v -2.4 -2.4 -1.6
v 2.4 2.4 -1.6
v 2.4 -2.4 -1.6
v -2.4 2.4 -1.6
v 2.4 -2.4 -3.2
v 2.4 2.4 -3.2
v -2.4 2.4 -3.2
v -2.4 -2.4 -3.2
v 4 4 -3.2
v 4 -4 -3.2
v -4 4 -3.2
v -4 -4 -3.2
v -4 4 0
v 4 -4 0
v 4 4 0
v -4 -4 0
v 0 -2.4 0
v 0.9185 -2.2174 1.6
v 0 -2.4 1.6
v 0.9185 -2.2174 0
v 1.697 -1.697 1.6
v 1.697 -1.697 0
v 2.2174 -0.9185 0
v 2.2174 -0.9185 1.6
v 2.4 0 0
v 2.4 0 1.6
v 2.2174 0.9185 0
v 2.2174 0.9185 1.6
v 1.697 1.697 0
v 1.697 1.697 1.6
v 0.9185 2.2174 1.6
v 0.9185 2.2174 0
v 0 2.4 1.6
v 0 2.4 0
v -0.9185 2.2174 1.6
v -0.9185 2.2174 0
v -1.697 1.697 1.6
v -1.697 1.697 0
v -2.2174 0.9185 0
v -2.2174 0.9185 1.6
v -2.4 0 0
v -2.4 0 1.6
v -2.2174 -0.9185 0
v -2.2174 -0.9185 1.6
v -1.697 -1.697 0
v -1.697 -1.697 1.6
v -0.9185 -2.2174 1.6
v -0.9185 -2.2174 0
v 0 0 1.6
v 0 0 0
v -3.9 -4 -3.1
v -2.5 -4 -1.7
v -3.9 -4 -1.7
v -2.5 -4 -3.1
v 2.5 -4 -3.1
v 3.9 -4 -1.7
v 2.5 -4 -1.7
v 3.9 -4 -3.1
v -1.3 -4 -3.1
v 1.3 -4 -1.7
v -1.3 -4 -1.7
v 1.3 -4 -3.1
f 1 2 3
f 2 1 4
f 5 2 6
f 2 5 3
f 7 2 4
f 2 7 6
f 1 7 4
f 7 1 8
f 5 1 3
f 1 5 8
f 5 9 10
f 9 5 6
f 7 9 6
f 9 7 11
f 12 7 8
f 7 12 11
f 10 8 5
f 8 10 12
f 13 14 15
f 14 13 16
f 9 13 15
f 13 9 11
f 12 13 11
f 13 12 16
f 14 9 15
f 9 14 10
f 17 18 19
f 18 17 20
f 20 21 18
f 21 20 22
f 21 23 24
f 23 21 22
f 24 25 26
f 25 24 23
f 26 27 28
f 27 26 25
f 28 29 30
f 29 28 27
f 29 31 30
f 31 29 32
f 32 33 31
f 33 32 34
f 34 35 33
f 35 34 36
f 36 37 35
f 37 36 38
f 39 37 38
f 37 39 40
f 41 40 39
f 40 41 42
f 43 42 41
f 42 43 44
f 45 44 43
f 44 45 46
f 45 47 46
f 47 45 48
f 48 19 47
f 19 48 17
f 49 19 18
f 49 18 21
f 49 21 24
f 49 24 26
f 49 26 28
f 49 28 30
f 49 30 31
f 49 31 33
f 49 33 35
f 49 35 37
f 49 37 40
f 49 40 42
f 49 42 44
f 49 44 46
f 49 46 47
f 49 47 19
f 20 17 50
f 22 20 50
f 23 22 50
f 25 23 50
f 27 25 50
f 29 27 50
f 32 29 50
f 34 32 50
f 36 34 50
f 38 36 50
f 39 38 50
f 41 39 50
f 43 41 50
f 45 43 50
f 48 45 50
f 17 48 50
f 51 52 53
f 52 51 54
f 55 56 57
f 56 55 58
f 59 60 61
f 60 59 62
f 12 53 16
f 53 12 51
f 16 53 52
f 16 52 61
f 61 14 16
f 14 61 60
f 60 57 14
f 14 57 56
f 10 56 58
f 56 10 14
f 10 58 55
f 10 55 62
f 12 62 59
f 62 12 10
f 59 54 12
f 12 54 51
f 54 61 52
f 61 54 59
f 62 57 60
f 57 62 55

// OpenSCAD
// file: ../p/4-4edge.scad
use <../lib.scad>
function ldraw_lib__4_4edge() = [
// 0 Circle 1.0
// 0 Name: 4-4edge.dat
// 0 Author: James Jessiman
// 0 !LDRAW_ORG Primitive UPDATE 2017-01
// 0 !LICENSE Licensed under CC BY 2.0 and CC BY 4.0 : see CAreadme.txt
// 
// 0 BFC CERTIFY CCW
  [0,"BFC","CERTIFY"],
  [0,"BFC","CCW"],
// 
// 0 !HISTORY 1998-12-15 [PTadmin] Official Update 1998-10
// 0 !HISTORY 2005-12-28 [PTadmin] Official Update 2005-01
// 0 !HISTORY 2007-06-24 [PTadmin] Header formatted for Contributor Agreement
// 0 !HISTORY 2008-07-01 [PTadmin] Official Update 2008-01
// 0 !HISTORY 2017-01-15 [Steffen] BFCed
// 0 !HISTORY 2017-12-30 [PTadmin] Official Update 2017-01
// 
// 
// 2 24 1 0 0 0.9239 0 0.3827
  [2,24,1,0,0,0.9239,0,0.3827],
// 2 24 0.9239 0 0.3827 0.7071 0 0.7071
  [2,24,0.9239,0,0.3827,0.7071,0,0.7071],
// 2 24 0.7071 0 0.7071 0.3827 0 0.9239
  [2,24,0.7071,0,0.7071,0.3827,0,0.9239],
// 2 24 0.3827 0 0.9239 0 0 1
  [2,24,0.3827,0,0.9239,0,0,1],
// 2 24 0 0 1 -0.3827 0 0.9239
  [2,24,0,0,1,-0.3827,0,0.9239],
// 2 24 -0.3827 0 0.9239 -0.7071 0 0.7071
  [2,24,-0.3827,0,0.9239,-0.7071,0,0.7071],
// 2 24 -0.7071 0 0.7071 -0.9239 0 0.3827
  [2,24,-0.7071,0,0.7071,-0.9239,0,0.3827],
// 2 24 -0.9239 0 0.3827 -1 0 -0
  [2,24,-0.9239,0,0.3827,-1,0,-0],
// 2 24 -1 0 -0 -0.9239 0 -0.3827
  [2,24,-1,0,-0,-0.9239,0,-0.3827],
// 2 24 -0.9239 0 -0.3827 -0.7071 0 -0.7071
  [2,24,-0.9239,0,-0.3827,-0.7071,0,-0.7071],
// 2 24 -0.7071 0 -0.7071 -0.3827 0 -0.9239
  [2,24,-0.7071,0,-0.7071,-0.3827,0,-0.9239],
// 2 24 -0.3827 0 -0.9239 0 0 -1
  [2,24,-0.3827,0,-0.9239,0,0,-1],
// 2 24 0 0 -1 0.3827 0 -0.9239
  [2,24,0,0,-1,0.3827,0,-0.9239],
// 2 24 0.3827 0 -0.9239 0.7071 0 -0.7071
  [2,24,0.3827,0,-0.9239,0.7071,0,-0.7071],
// 2 24 0.7071 0 -0.7071 0.9239 0 -0.3827
  [2,24,0.7071,0,-0.7071,0.9239,0,-0.3827],
// 2 24 0.9239 0 -0.3827 1 0 0
  [2,24,0.9239,0,-0.3827,1,0,0],
];
module ldraw_lib__4_4edge(step=0, col=false, unit=2/5, alt=false, line=0.2, solid=!$preview)
    makepoly(ldraw_lib__4_4edge(), step=step, col=col, unit=unit, alt=alt, line=line, solid=solid);
ldraw_lib__4_4edge(line=0.2);
// file: ../p/4-4disc.scad
use <../lib.scad>
function ldraw_lib__4_4disc() = [
// 0 Disc 1.0
// 0 Name: 4-4disc.dat
// 0 Author: James Jessiman
// 0 !LDRAW_ORG Primitive UPDATE 2002-02
// 0 !LICENSE Licensed under CC BY 2.0 and CC BY 4.0 : see CAreadme.txt
// 
// 0 BFC CERTIFY CCW
  [0,"BFC","CERTIFY"],
  [0,"BFC","CCW"],
// 
// 0 !HISTORY 1998-12-15 [PTadmin] Official Update 1998-10
// 0 !HISTORY 2002-03-23 [sbliss] Added BFC statement
// 0 !HISTORY 2002-04-25 [PTadmin] Official Update 2002-02
// 0 !HISTORY 2007-06-24 [PTadmin] Header formatted for Contributor Agreement
// 0 !HISTORY 2008-07-01 [PTadmin] Official Update 2008-01
// 
// 
// 3 16 0 0 0 1 0 0 0.9239 0 0.3827
  [3,16,0,0,0,1,0,0,0.9239,0,0.3827],
// 3 16 0 0 0 0.9239 0 0.3827 0.7071 0 0.7071
  [3,16,0,0,0,0.9239,0,0.3827,0.7071,0,0.7071],
// 3 16 0 0 0 0.7071 0 0.7071 0.3827 0 0.9239
  [3,16,0,0,0,0.7071,0,0.7071,0.3827,0,0.9239],
// 3 16 0 0 0 0.3827 0 0.9239 0 0 1
  [3,16,0,0,0,0.3827,0,0.9239,0,0,1],
// 3 16 0 0 0 0 0 1 -0.3827 0 0.9239
  [3,16,0,0,0,0,0,1,-0.3827,0,0.9239],
// 3 16 0 0 0 -0.3827 0 0.9239 -0.7071 0 0.7071
  [3,16,0,0,0,-0.3827,0,0.9239,-0.7071,0,0.7071],
// 3 16 0 0 0 -0.7071 0 0.7071 -0.9239 0 0.3827
  [3,16,0,0,0,-0.7071,0,0.7071,-0.9239,0,0.3827],
// 3 16 0 0 0 -0.9239 0 0.3827 -1 0 -0
  [3,16,0,0,0,-0.9239,0,0.3827,-1,0,-0],
// 3 16 0 0 0 -1 0 -0 -0.9239 0 -0.3827
  [3,16,0,0,0,-1,0,-0,-0.9239,0,-0.3827],
// 3 16 0 0 0 -0.9239 0 -0.3827 -0.7071 0 -0.7071
  [3,16,0,0,0,-0.9239,0,-0.3827,-0.7071,0,-0.7071],
// 3 16 0 0 0 -0.7071 0 -0.7071 -0.3827 0 -0.9239
  [3,16,0,0,0,-0.7071,0,-0.7071,-0.3827,0,-0.9239],
// 3 16 0 0 0 -0.3827 0 -0.9239 0 0 -1
  [3,16,0,0,0,-0.3827,0,-0.9239,0,0,-1],
// 3 16 0 0 0 0 0 -1 0.3827 0 -0.9239
  [3,16,0,0,0,0,0,-1,0.3827,0,-0.9239],
// 3 16 0 0 0 0.3827 0 -0.9239 0.7071 0 -0.7071
  [3,16,0,0,0,0.3827,0,-0.9239,0.7071,0,-0.7071],
// 3 16 0 0 0 0.7071 0 -0.7071 0.9239 0 -0.3827
  [3,16,0,0,0,0.7071,0,-0.7071,0.9239,0,-0.3827],
// 3 16 0 0 0 0.9239 0 -0.3827 1 0 0
  [3,16,0,0,0,0.9239,0,-0.3827,1,0,0],
// 0
];
module ldraw_lib__4_4disc(step=0, col=false, unit=2/5, alt=false, line=0.2, solid=!$preview)
    makepoly(ldraw_lib__4_4disc(), step=step, col=col, unit=unit, alt=alt, line=line, solid=solid);
ldraw_lib__4_4disc(line=0.2);
// file: ../p/4-4cyli.scad
use <../lib.scad>
$fa=1; $fs=0.2;
function ldraw_lib__4_4cyli(realsolid=false) = [
// 0 Cylinder 1.0
// 0 Name: 4-4cyli.dat
// 0 Author: James Jessiman
// 0 !LDRAW_ORG Primitive UPDATE 2005-01
// 0 !LICENSE Licensed under CC BY 2.0 and CC BY 4.0 : see CAreadme.txt
// 
// 0 BFC CERTIFY CCW
  [0,"BFC","CERTIFY"],
  [0,"BFC","CCW"],
// 
// 0 !HISTORY 1998-12-15 [PTadmin] Official Update 1998-10
// 0 !HISTORY 2002-03-23 [sbliss] Added BFC statement; merged headers from files in distributions LDraw 0.27 and Complete.
// 0 !HISTORY 2002-04-25 [PTadmin] Official Update 2002-02
// 0 !HISTORY 2004-12-14 [guyvivan] BFC CCW
// 0 !HISTORY 2005-12-28 [PTadmin] Official Update 2005-01
// 0 !HISTORY 2007-06-24 [PTadmin] Header formatted for Contributor Agreement
// 0 !HISTORY 2008-07-01 [PTadmin] Official Update 2008-01
// 
// 
// 4 16 1 1 0 0.9239 1 0.3827 0.9239 0 0.3827 1 0 0
  [4,16,1,1,0,0.9239,1,0.3827,0.9239,0,0.3827,1,0,0],
// 5 24 1 0 0 1 1 0 0.9239 0 0.3827 0.9239 0 -0.3827
  [5,24,1,0,0,1,1,0,0.9239,0,0.3827,0.9239,0,-0.3827],
// 4 16 0.9239 1 0.3827 0.7071 1 0.7071 0.7071 0 0.7071 0.9239 0 0.3827
  [4,16,0.9239,1,0.3827,0.7071,1,0.7071,0.7071,0,0.7071,0.9239,0,0.3827],
// 5 24 0.9239 0 0.3827 0.9239 1 0.3827 0.7071 0 0.7071 1 0 0
  [5,24,0.9239,0,0.3827,0.9239,1,0.3827,0.7071,0,0.7071,1,0,0],
// 4 16 0.7071 1 0.7071 0.3827 1 0.9239 0.3827 0 0.9239 0.7071 0 0.7071
  [4,16,0.7071,1,0.7071,0.3827,1,0.9239,0.3827,0,0.9239,0.7071,0,0.7071],
// 5 24 0.7071 0 0.7071 0.7071 1 0.7071 0.3827 0 0.9239 0.9239 0 0.3827
  [5,24,0.7071,0,0.7071,0.7071,1,0.7071,0.3827,0,0.9239,0.9239,0,0.3827],
// 4 16 0.3827 1 0.9239 0 1 1 0 0 1 0.3827 0 0.9239
  [4,16,0.3827,1,0.9239,0,1,1,0,0,1,0.3827,0,0.9239],
// 5 24 0.3827 0 0.9239 0.3827 1 0.9239 0 0 1 0.7071 0 0.7071
  [5,24,0.3827,0,0.9239,0.3827,1,0.9239,0,0,1,0.7071,0,0.7071],
// 4 16 0 1 1 -0.3827 1 0.9239 -0.3827 0 0.9239 0 0 1
  [4,16,0,1,1,-0.3827,1,0.9239,-0.3827,0,0.9239,0,0,1],
// 5 24 0 0 1 0 1 1 -0.3827 0 0.9239 0.3827 0 0.9239
  [5,24,0,0,1,0,1,1,-0.3827,0,0.9239,0.3827,0,0.9239],
// 4 16 -0.3827 1 0.9239 -0.7071 1 0.7071 -0.7071 0 0.7071 -0.3827 0 0.9239
  [4,16,-0.3827,1,0.9239,-0.7071,1,0.7071,-0.7071,0,0.7071,-0.3827,0,0.9239],
// 5 24 -0.3827 0 0.9239 -0.3827 1 0.9239 -0.7071 0 0.7071 0 0 1
  [5,24,-0.3827,0,0.9239,-0.3827,1,0.9239,-0.7071,0,0.7071,0,0,1],
// 4 16 -0.7071 1 0.7071 -0.9239 1 0.3827 -0.9239 0 0.3827 -0.7071 0 0.7071
  [4,16,-0.7071,1,0.7071,-0.9239,1,0.3827,-0.9239,0,0.3827,-0.7071,0,0.7071],
// 5 24 -0.7071 0 0.7071 -0.7071 1 0.7071 -0.9239 0 0.3827 -0.3827 0 0.9239
  [5,24,-0.7071,0,0.7071,-0.7071,1,0.7071,-0.9239,0,0.3827,-0.3827,0,0.9239],
// 4 16 -0.9239 1 0.3827 -1 1 0 -1 0 0 -0.9239 0 0.3827
  [4,16,-0.9239,1,0.3827,-1,1,0,-1,0,0,-0.9239,0,0.3827],
// 5 24 -0.9239 0 0.3827 -0.9239 1 0.3827 -1 0 0 -0.7071 0 0.7071
  [5,24,-0.9239,0,0.3827,-0.9239,1,0.3827,-1,0,0,-0.7071,0,0.7071],
// 4 16 -1 1 0 -0.9239 1 -0.3827 -0.9239 0 -0.3827 -1 0 0
  [4,16,-1,1,0,-0.9239,1,-0.3827,-0.9239,0,-0.3827,-1,0,0],
// 5 24 -1 0 0 -1 1 0 -0.9239 0 -0.3827 -0.9239 0 0.3827
  [5,24,-1,0,0,-1,1,0,-0.9239,0,-0.3827,-0.9239,0,0.3827],
// 4 16 -0.9239 1 -0.3827 -0.7071 1 -0.7071 -0.7071 0 -0.7071 -0.9239 0 -0.3827
  [4,16,-0.9239,1,-0.3827,-0.7071,1,-0.7071,-0.7071,0,-0.7071,-0.9239,0,-0.3827],
// 5 24 -0.9239 0 -0.3827 -0.9239 1 -0.3827 -0.7071 0 -0.7071 -1 0 0
  [5,24,-0.9239,0,-0.3827,-0.9239,1,-0.3827,-0.7071,0,-0.7071,-1,0,0],
// 4 16 -0.7071 1 -0.7071 -0.3827 1 -0.9239 -0.3827 0 -0.9239 -0.7071 0 -0.7071
  [4,16,-0.7071,1,-0.7071,-0.3827,1,-0.9239,-0.3827,0,-0.9239,-0.7071,0,-0.7071],
// 5 24 -0.7071 0 -0.7071 -0.7071 1 -0.7071 -0.3827 0 -0.9239 -0.9239 0 -0.3827
  [5,24,-0.7071,0,-0.7071,-0.7071,1,-0.7071,-0.3827,0,-0.9239,-0.9239,0,-0.3827],
// 4 16 -0.3827 1 -0.9239 0 1 -1 0 0 -1 -0.3827 0 -0.9239
  [4,16,-0.3827,1,-0.9239,0,1,-1,0,0,-1,-0.3827,0,-0.9239],
// 5 24 -0.3827 0 -0.9239 -0.3827 1 -0.9239 0 0 -1 -0.7071 0 -0.7071
  [5,24,-0.3827,0,-0.9239,-0.3827,1,-0.9239,0,0,-1,-0.7071,0,-0.7071],
// 4 16 0 1 -1 0.3827 1 -0.9239 0.3827 0 -0.9239 0 0 -1
  [4,16,0,1,-1,0.3827,1,-0.9239,0.3827,0,-0.9239,0,0,-1],
// 5 24 0 0 -1 0 1 -1 0.3827 0 -0.9239 -0.3827 0 -0.9239
  [5,24,0,0,-1,0,1,-1,0.3827,0,-0.9239,-0.3827,0,-0.9239],
// 4 16 0.3827 1 -0.9239 0.7071 1 -0.7071 0.7071 0 -0.7071 0.3827 0 -0.9239
  [4,16,0.3827,1,-0.9239,0.7071,1,-0.7071,0.7071,0,-0.7071,0.3827,0,-0.9239],
// 5 24 0.3827 0 -0.9239 0.3827 1 -0.9239 0.7071 0 -0.7071 0 0 -1
  [5,24,0.3827,0,-0.9239,0.3827,1,-0.9239,0.7071,0,-0.7071,0,0,-1],
// 4 16 0.7071 1 -0.7071 0.9239 1 -0.3827 0.9239 0 -0.3827 0.7071 0 -0.7071
  [4,16,0.7071,1,-0.7071,0.9239,1,-0.3827,0.9239,0,-0.3827,0.7071,0,-0.7071],
// 5 24 0.7071 0 -0.7071 0.7071 1 -0.7071 0.9239 0 -0.3827 0.3827 0 -0.9239
  [5,24,0.7071,0,-0.7071,0.7071,1,-0.7071,0.9239,0,-0.3827,0.3827,0,-0.9239],
// 4 16 0.9239 1 -0.3827 1 1 0 1 0 0 0.9239 0 -0.3827
  [4,16,0.9239,1,-0.3827,1,1,0,1,0,0,0.9239,0,-0.3827],
// 5 24 0.9239 0 -0.3827 0.9239 1 -0.3827 1 0 0 0.7071 0 -0.7071
  [5,24,0.9239,0,-0.3827,0.9239,1,-0.3827,1,0,0,0.7071,0,-0.7071],
// 0
];
module ldraw_lib__4_4cyli(step=0, col=false, unit=2/5, alt=false, line=0.2, solid=!$preview)
    makepoly(ldraw_lib__4_4cyli(solid), step=step, col=col, unit=unit, alt=alt, line=line, solid=solid);
ldraw_lib__4_4cyli(line=0.2);
// file: ../p/stud.scad
use <../lib.scad>
use <4-4cyli.scad>
use <4-4disc.scad>
use <4-4edge.scad>
function ldraw_lib__stud() = [
// 0 Stud
// 0 Name: stud.dat
// 0 Author: James Jessiman
// 0 !LDRAW_ORG Primitive UPDATE 2012-01
// 0 !LICENSE Licensed under CC BY 4.0 : see CAreadme.txt
// 
// 0 BFC CERTIFY CCW
  [0,"BFC","CERTIFY"],
  [0,"BFC","CCW"],
// 
// 0 !HISTORY 2002-04-04 [sbliss] Modified for BFC compliance
// 0 !HISTORY 2002-04-25 [PTadmin] Official Update 2002-02
// 0 !HISTORY 2007-06-24 [PTadmin] Header formatted for Contributor Agreement
// 0 !HISTORY 2008-07-01 [PTadmin] Official Update 2008-01
// 0 !HISTORY 2012-02-16 [Philo] Changed to CCW
// 0 !HISTORY 2012-03-30 [PTadmin] Official Update 2012-01
// 
// 
// 1 16 0 0 0 6 0 0 0 1 0 0 0 6 4-4edge.dat
  [1,16,0,0,0,6,0,0,0,1,0,0,0,6, ldraw_lib__4_4edge()],
// 1 16 0 -4 0 6 0 0 0 1 0 0 0 6 4-4edge.dat
  [1,16,0,-4,0,6,0,0,0,1,0,0,0,6, ldraw_lib__4_4edge()],
// 1 16 0 0 0 6 0 0 0 -4 0 0 0 6 4-4cyli.dat
  [1,16,0,0,0,6,0,0,0,-4,0,0,0,6, ldraw_lib__4_4cyli()],
// 1 16 0 -4 0 6 0 0 0 1 0 0 0 6 4-4disc.dat
  [1,16,0,-4,0,6,0,0,0,1,0,0,0,6, ldraw_lib__4_4disc()],
  [-1,16,0,0,0,6,0,0,0,-1,0,0,0,6, ldraw_lib__4_4disc()],
];
module ldraw_lib__stud(step=0, col=false, unit=2/5, alt=false, line=0.2, solid=!$preview)
    makepoly(ldraw_lib__stud(), step=step, col=col, unit=unit, alt=alt, line=line, solid=solid);
ldraw_lib__stud(line=0.2);
// file: ../p/box5.scad
use <../lib.scad>
function ldraw_lib__box5() = [
// 0 Box with 5 Faces and All Edges
// 0 Name: box5.dat
// 0 Author: James Jessiman
// 0 !LDRAW_ORG Primitive UPDATE 2012-01
// 0 !LICENSE Licensed under CC BY 2.0 and CC BY 4.0 : see CAreadme.txt
// 
// 0 BFC CERTIFY CCW
  [0,"BFC","CERTIFY"],
  [0,"BFC","CCW"],
// 
// 0 !HISTORY 2002-04-03 [sbliss] Modified for BFC compliance
// 0 !HISTORY 2002-04-25 [PTadmin] Official Update 2002-02
// 0 !HISTORY 2007-06-24 [PTadmin] Header formatted for Contributor Agreement
// 0 !HISTORY 2008-07-01 [PTadmin] Official Update 2008-01
// 0 !HISTORY 2012-02-16 [Philo] Changed to CCW
// 0 !HISTORY 2012-03-30 [PTadmin] Official Update 2012-01
// 
// 
// 2 24 1 1 1 -1 1 1
  [2,24,1,1,1,-1,1,1],
// 2 24 -1 1 1 -1 1 -1
  [2,24,-1,1,1,-1,1,-1],
// 2 24 -1 1 -1 1 1 -1
  [2,24,-1,1,-1,1,1,-1],
// 2 24 1 1 -1 1 1 1
  [2,24,1,1,-1,1,1,1],
// 2 24 1 0 1 -1 0 1
  [2,24,1,0,1,-1,0,1],
// 2 24 -1 0 1 -1 0 -1
  [2,24,-1,0,1,-1,0,-1],
// 2 24 -1 0 -1 1 0 -1
  [2,24,-1,0,-1,1,0,-1],
// 2 24 1 0 -1 1 0 1
  [2,24,1,0,-1,1,0,1],
// 2 24 1 0 1 1 1 1
  [2,24,1,0,1,1,1,1],
// 2 24 -1 0 1 -1 1 1
  [2,24,-1,0,1,-1,1,1],
// 2 24 1 0 -1 1 1 -1
  [2,24,1,0,-1,1,1,-1],
// 2 24 -1 0 -1 -1 1 -1
  [2,24,-1,0,-1,-1,1,-1],
// 4 16 -1 1 1 1 1 1 1 1 -1 -1 1 -1
  [4,16,-1,1,1,1,1,1,1,1,-1,-1,1,-1],
// 4 16 -1 1 1 -1 0 1 1 0 1 1 1 1
  [4,16,-1,1,1,-1,0,1,1,0,1,1,1,1],
// 4 16 -1 1 -1 -1 0 -1 -1 0 1 -1 1 1
  [4,16,-1,1,-1,-1,0,-1,-1,0,1,-1,1,1],
// 4 16 1 1 -1 1 0 -1 -1 0 -1 -1 1 -1
  [4,16,1,1,-1,1,0,-1,-1,0,-1,-1,1,-1],
// 4 16 1 1 1 1 0 1 1 0 -1 1 1 -1
  [4,16,1,1,1,1,0,1,1,0,-1,1,1,-1],
];
makepoly(ldraw_lib__box5(), line=0.2);
// file: ../p/box4t.scad
use <../lib.scad>
function ldraw_lib__box4t() = [
// 0 Box with 4 Adjacent Faces and All Edges
// 0 Name: box4t.dat
// 0 Author: Tore Eriksson [Tore_Eriksson]
// 0 !LDRAW_ORG Primitive UPDATE 2003-02
// 0 !LICENSE Licensed under CC BY 2.0 and CC BY 4.0 : see CAreadme.txt
// 
// 0 BFC CERTIFY CCW
  [0,"BFC","CERTIFY"],
  [0,"BFC","CCW"],
// 
// 0 !HISTORY 1997-09-29 [PTadmin] Official Update 1997-15
// 0 !HISTORY 2002-08-31 [izanette] Modified with WINDZ for BFC compliance
// 0 !HISTORY 2003-08-01 [PTadmin] Official Update 2003-02
// 0 !HISTORY 2007-06-24 [PTadmin] Header formatted for Contributor Agreement
// 0 !HISTORY 2008-07-01 [PTadmin] Official Update 2008-01
// 
// 
// 2 24 1 1 1 -1 1 1
  [2,24,1,1,1,-1,1,1],
// 2 24 -1 1 1 -1 1 -1
  [2,24,-1,1,1,-1,1,-1],
// 2 24 -1 1 -1 1 1 -1
  [2,24,-1,1,-1,1,1,-1],
// 2 24 1 1 -1 1 1 1
  [2,24,1,1,-1,1,1,1],
// 2 24 1 0 1 -1 0 1
  [2,24,1,0,1,-1,0,1],
// 2 24 -1 0 1 -1 0 -1
  [2,24,-1,0,1,-1,0,-1],
// 2 24 -1 0 -1 1 0 -1
  [2,24,-1,0,-1,1,0,-1],
// 2 24 1 0 -1 1 0 1
  [2,24,1,0,-1,1,0,1],
// 2 24 1 0 1 1 1 1
  [2,24,1,0,1,1,1,1],
// 2 24 -1 0 1 -1 1 1
  [2,24,-1,0,1,-1,1,1],
// 2 24 1 0 -1 1 1 -1
  [2,24,1,0,-1,1,1,-1],
// 2 24 -1 0 -1 -1 1 -1
  [2,24,-1,0,-1,-1,1,-1],
// 4 16 1 1 1 1 1 -1 -1 1 -1 -1 1 1
  [4,16,1,1,1,1,1,-1,-1,1,-1,-1,1,1],
// 4 16 1 1 1 -1 1 1 -1 0 1 1 0 1
  [4,16,1,1,1,-1,1,1,-1,0,1,1,0,1],
// 4 16 -1 1 1 -1 1 -1 -1 0 -1 -1 0 1
  [4,16,-1,1,1,-1,1,-1,-1,0,-1,-1,0,1],
// 0 4 16 -1 1 -1 -1 0 -1 1 0 -1 1 1 -1
// 4 16 1 1 -1 1 1 1 1 0 1 1 0 -1
  [4,16,1,1,-1,1,1,1,1,0,1,1,0,-1],
// 0
];
makepoly(ldraw_lib__box4t(), line=0.2);
// file: s/3024s01.scad
use <../../lib.scad>
use <../../p/box4t.scad>
use <../../p/box5.scad>
use <../../p/stud.scad>
function ldraw_lib__s__3024s01() = [
// 0 ~Plate  1 x  1 without Front Face
// 0 Name: s\3024s01.dat
// 0 Author: Tore Eriksson [Tore_Eriksson]
// 0 !LDRAW_ORG Subpart UPDATE 2012-03
// 0 !LICENSE Licensed under CC BY 2.0 and CC BY 4.0 : see CAreadme.txt
// 
// 0 BFC CERTIFY CCW
  [0,"BFC","CERTIFY"],
  [0,"BFC","CCW"],
// 
// 0 !HISTORY 2012-12-28 [PTadmin] Official Update 2012-03
// 
// 
// 0 BFC INVERTNEXT
  [0,"BFC","INVERTNEXT"],
// 1 16 0 8 0 0 0 6 0 -4 0 -6 0 0 box5.dat
  [1,16,0,8,0,0,0,6,0,-4,0,-6,0,0, ldraw_lib__box5()],
// 4 16 10 8 -10 6 8 -6 6 8 6 10 8 10
  [4,16,10,8,-10,6,8,-6,6,8,6,10,8,10],
// 4 16 10 8 10 6 8 6 -6 8 6 -10 8 10
  [4,16,10,8,10,6,8,6,-6,8,6,-10,8,10],
// 4 16 -10 8 10 -6 8 6 -6 8 -6 -10 8 -10
  [4,16,-10,8,10,-6,8,6,-6,8,-6,-10,8,-10],
// 4 16 -10 8 -10 -6 8 -6 6 8 -6 10 8 -10
  [4,16,-10,8,-10,-6,8,-6,6,8,-6,10,8,-10],
// 1 16 0 8 0 10 0 0 0 -8 0 0 0 10 box4t.dat
  [1,16,0,8,0,10,0,0,0,-8,0,0,0,10, ldraw_lib__box4t()],
// 1 16 0 0 0 0 0 1 0 1 0 -1 0 0 stud.dat
  [1,16,0,0,0,0,0,1,0,1,0,-1,0,0, ldraw_lib__stud()],
];
module ldraw_lib__s__3024s01(step=0, col=false, unit=2/5, alt=false, line=0.2, solid=!$preview)
    makepoly(ldraw_lib__s__3024s01(), step=step, col=col, unit=unit, alt=alt, line=line, solid=solid);
ldraw_lib__s__3024s01(line=0.2);
// main file
use <../lib.scad>
use <s/3024s01.scad>
function ldraw_lib__3024px0() = [
// 0 Plate  1 x  1 with  2 Black Squares and Dark Orange Rectangle Pattern
// 0 Name: 3024px0.dat
// 0 Author: Vincent Messenet [Cheenzo]
// 0 !LDRAW_ORG Part UPDATE 2022-04
// 0 !LICENSE Licensed under CC BY 4.0 : see CAreadme.txt
// 
// 0 BFC CERTIFY CCW
  [0,"BFC","CERTIFY"],
  [0,"BFC","CCW"],
// 
// 0 !KEYWORDS Axolotl, BrickLink 3024pb017, Eyes, face, Minecraft, Nose
// 0 !KEYWORDS Rebrickable 3024pr0020, Set 21180
// 
// 0 !HISTORY 2022-07-18 [PTadmin] Official Update 2022-04
// 
// 
// 1 16 0 0 0 1 0 0 0 1 0 0 0 1 s\3024s01.dat
  [1,16,0,0,0,1,0,0,0,1,0,0,0,1, ldraw_lib__s__3024s01()],
// 
// 4 0 -6.25 7.75 -10 -6.25 4.25 -10 -9.75 4.25 -10 -9.75 7.75 -10
  [4,0,-6.25,7.75,-10,-6.25,4.25,-10,-9.75,4.25,-10,-9.75,7.75,-10],
// 4 0 6.25 4.25 -10 6.25 7.75 -10 9.75 7.75 -10 9.75 4.25 -10
  [4,0,6.25,4.25,-10,6.25,7.75,-10,9.75,7.75,-10,9.75,4.25,-10],
// 
// 4 484 3.25 7.75 -10 3.25 4.25 -10 -3.25 4.25 -10 -3.25 7.75 -10
  [4,484,3.25,7.75,-10,3.25,4.25,-10,-3.25,4.25,-10,-3.25,7.75,-10],
// 4 16 -10 8 -10 -9.75 7.75 -10 -9.75 4.25 -10 -10 0 -10
  [4,16,-10,8,-10,-9.75,7.75,-10,-9.75,4.25,-10,-10,0,-10],
// 3 16 -10 0 -10 -9.75 4.25 -10 -6.25 4.25 -10
  [3,16,-10,0,-10,-9.75,4.25,-10,-6.25,4.25,-10],
// 3 16 -10 0 -10 -6.25 4.25 -10 -3.25 4.25 -10
  [3,16,-10,0,-10,-6.25,4.25,-10,-3.25,4.25,-10],
// 4 16 -10 0 -10 -3.25 4.25 -10 3.25 4.25 -10 10 0 -10
  [4,16,-10,0,-10,-3.25,4.25,-10,3.25,4.25,-10,10,0,-10],
// 3 16 3.25 4.25 -10 6.25 4.25 -10 10 0 -10
  [3,16,3.25,4.25,-10,6.25,4.25,-10,10,0,-10],
// 3 16 10 0 -10 6.25 4.25 -10 9.75 4.25 -10
  [3,16,10,0,-10,6.25,4.25,-10,9.75,4.25,-10],
// 4 16 10 0 -10 9.75 4.25 -10 9.75 7.75 -10 10 8 -10
  [4,16,10,0,-10,9.75,4.25,-10,9.75,7.75,-10,10,8,-10],
// 3 16 10 8 -10 9.75 7.75 -10 6.25 7.75 -10
  [3,16,10,8,-10,9.75,7.75,-10,6.25,7.75,-10],
// 3 16 10 8 -10 6.25 7.75 -10 3.25 7.75 -10
  [3,16,10,8,-10,6.25,7.75,-10,3.25,7.75,-10],
// 4 16 10 8 -10 3.25 7.75 -10 -3.25 7.75 -10 -10 8 -10
  [4,16,10,8,-10,3.25,7.75,-10,-3.25,7.75,-10,-10,8,-10],
// 3 16 -3.25 7.75 -10 -6.25 7.75 -10 -10 8 -10
  [3,16,-3.25,7.75,-10,-6.25,7.75,-10,-10,8,-10],
// 3 16 -10 8 -10 -6.25 7.75 -10 -9.75 7.75 -10
  [3,16,-10,8,-10,-6.25,7.75,-10,-9.75,7.75,-10],
// 4 16 -3.25 7.75 -10 -3.25 4.25 -10 -6.25 4.25 -10 -6.25 7.75 -10
  [4,16,-3.25,7.75,-10,-3.25,4.25,-10,-6.25,4.25,-10,-6.25,7.75,-10],
// 4 16 6.25 7.75 -10 6.25 4.25 -10 3.25 4.25 -10 3.25 7.75 -10
  [4,16,6.25,7.75,-10,6.25,4.25,-10,3.25,4.25,-10,3.25,7.75,-10],
];
module ldraw_lib__3024px0(step=0, col=false, unit=2/5, alt=false, line=0.2, solid=!$preview)
    makepoly(ldraw_lib__3024px0(), step=step, col=col, unit=unit, alt=alt, line=line, solid=solid);
ldraw_lib__3024px0(line=0.2);
